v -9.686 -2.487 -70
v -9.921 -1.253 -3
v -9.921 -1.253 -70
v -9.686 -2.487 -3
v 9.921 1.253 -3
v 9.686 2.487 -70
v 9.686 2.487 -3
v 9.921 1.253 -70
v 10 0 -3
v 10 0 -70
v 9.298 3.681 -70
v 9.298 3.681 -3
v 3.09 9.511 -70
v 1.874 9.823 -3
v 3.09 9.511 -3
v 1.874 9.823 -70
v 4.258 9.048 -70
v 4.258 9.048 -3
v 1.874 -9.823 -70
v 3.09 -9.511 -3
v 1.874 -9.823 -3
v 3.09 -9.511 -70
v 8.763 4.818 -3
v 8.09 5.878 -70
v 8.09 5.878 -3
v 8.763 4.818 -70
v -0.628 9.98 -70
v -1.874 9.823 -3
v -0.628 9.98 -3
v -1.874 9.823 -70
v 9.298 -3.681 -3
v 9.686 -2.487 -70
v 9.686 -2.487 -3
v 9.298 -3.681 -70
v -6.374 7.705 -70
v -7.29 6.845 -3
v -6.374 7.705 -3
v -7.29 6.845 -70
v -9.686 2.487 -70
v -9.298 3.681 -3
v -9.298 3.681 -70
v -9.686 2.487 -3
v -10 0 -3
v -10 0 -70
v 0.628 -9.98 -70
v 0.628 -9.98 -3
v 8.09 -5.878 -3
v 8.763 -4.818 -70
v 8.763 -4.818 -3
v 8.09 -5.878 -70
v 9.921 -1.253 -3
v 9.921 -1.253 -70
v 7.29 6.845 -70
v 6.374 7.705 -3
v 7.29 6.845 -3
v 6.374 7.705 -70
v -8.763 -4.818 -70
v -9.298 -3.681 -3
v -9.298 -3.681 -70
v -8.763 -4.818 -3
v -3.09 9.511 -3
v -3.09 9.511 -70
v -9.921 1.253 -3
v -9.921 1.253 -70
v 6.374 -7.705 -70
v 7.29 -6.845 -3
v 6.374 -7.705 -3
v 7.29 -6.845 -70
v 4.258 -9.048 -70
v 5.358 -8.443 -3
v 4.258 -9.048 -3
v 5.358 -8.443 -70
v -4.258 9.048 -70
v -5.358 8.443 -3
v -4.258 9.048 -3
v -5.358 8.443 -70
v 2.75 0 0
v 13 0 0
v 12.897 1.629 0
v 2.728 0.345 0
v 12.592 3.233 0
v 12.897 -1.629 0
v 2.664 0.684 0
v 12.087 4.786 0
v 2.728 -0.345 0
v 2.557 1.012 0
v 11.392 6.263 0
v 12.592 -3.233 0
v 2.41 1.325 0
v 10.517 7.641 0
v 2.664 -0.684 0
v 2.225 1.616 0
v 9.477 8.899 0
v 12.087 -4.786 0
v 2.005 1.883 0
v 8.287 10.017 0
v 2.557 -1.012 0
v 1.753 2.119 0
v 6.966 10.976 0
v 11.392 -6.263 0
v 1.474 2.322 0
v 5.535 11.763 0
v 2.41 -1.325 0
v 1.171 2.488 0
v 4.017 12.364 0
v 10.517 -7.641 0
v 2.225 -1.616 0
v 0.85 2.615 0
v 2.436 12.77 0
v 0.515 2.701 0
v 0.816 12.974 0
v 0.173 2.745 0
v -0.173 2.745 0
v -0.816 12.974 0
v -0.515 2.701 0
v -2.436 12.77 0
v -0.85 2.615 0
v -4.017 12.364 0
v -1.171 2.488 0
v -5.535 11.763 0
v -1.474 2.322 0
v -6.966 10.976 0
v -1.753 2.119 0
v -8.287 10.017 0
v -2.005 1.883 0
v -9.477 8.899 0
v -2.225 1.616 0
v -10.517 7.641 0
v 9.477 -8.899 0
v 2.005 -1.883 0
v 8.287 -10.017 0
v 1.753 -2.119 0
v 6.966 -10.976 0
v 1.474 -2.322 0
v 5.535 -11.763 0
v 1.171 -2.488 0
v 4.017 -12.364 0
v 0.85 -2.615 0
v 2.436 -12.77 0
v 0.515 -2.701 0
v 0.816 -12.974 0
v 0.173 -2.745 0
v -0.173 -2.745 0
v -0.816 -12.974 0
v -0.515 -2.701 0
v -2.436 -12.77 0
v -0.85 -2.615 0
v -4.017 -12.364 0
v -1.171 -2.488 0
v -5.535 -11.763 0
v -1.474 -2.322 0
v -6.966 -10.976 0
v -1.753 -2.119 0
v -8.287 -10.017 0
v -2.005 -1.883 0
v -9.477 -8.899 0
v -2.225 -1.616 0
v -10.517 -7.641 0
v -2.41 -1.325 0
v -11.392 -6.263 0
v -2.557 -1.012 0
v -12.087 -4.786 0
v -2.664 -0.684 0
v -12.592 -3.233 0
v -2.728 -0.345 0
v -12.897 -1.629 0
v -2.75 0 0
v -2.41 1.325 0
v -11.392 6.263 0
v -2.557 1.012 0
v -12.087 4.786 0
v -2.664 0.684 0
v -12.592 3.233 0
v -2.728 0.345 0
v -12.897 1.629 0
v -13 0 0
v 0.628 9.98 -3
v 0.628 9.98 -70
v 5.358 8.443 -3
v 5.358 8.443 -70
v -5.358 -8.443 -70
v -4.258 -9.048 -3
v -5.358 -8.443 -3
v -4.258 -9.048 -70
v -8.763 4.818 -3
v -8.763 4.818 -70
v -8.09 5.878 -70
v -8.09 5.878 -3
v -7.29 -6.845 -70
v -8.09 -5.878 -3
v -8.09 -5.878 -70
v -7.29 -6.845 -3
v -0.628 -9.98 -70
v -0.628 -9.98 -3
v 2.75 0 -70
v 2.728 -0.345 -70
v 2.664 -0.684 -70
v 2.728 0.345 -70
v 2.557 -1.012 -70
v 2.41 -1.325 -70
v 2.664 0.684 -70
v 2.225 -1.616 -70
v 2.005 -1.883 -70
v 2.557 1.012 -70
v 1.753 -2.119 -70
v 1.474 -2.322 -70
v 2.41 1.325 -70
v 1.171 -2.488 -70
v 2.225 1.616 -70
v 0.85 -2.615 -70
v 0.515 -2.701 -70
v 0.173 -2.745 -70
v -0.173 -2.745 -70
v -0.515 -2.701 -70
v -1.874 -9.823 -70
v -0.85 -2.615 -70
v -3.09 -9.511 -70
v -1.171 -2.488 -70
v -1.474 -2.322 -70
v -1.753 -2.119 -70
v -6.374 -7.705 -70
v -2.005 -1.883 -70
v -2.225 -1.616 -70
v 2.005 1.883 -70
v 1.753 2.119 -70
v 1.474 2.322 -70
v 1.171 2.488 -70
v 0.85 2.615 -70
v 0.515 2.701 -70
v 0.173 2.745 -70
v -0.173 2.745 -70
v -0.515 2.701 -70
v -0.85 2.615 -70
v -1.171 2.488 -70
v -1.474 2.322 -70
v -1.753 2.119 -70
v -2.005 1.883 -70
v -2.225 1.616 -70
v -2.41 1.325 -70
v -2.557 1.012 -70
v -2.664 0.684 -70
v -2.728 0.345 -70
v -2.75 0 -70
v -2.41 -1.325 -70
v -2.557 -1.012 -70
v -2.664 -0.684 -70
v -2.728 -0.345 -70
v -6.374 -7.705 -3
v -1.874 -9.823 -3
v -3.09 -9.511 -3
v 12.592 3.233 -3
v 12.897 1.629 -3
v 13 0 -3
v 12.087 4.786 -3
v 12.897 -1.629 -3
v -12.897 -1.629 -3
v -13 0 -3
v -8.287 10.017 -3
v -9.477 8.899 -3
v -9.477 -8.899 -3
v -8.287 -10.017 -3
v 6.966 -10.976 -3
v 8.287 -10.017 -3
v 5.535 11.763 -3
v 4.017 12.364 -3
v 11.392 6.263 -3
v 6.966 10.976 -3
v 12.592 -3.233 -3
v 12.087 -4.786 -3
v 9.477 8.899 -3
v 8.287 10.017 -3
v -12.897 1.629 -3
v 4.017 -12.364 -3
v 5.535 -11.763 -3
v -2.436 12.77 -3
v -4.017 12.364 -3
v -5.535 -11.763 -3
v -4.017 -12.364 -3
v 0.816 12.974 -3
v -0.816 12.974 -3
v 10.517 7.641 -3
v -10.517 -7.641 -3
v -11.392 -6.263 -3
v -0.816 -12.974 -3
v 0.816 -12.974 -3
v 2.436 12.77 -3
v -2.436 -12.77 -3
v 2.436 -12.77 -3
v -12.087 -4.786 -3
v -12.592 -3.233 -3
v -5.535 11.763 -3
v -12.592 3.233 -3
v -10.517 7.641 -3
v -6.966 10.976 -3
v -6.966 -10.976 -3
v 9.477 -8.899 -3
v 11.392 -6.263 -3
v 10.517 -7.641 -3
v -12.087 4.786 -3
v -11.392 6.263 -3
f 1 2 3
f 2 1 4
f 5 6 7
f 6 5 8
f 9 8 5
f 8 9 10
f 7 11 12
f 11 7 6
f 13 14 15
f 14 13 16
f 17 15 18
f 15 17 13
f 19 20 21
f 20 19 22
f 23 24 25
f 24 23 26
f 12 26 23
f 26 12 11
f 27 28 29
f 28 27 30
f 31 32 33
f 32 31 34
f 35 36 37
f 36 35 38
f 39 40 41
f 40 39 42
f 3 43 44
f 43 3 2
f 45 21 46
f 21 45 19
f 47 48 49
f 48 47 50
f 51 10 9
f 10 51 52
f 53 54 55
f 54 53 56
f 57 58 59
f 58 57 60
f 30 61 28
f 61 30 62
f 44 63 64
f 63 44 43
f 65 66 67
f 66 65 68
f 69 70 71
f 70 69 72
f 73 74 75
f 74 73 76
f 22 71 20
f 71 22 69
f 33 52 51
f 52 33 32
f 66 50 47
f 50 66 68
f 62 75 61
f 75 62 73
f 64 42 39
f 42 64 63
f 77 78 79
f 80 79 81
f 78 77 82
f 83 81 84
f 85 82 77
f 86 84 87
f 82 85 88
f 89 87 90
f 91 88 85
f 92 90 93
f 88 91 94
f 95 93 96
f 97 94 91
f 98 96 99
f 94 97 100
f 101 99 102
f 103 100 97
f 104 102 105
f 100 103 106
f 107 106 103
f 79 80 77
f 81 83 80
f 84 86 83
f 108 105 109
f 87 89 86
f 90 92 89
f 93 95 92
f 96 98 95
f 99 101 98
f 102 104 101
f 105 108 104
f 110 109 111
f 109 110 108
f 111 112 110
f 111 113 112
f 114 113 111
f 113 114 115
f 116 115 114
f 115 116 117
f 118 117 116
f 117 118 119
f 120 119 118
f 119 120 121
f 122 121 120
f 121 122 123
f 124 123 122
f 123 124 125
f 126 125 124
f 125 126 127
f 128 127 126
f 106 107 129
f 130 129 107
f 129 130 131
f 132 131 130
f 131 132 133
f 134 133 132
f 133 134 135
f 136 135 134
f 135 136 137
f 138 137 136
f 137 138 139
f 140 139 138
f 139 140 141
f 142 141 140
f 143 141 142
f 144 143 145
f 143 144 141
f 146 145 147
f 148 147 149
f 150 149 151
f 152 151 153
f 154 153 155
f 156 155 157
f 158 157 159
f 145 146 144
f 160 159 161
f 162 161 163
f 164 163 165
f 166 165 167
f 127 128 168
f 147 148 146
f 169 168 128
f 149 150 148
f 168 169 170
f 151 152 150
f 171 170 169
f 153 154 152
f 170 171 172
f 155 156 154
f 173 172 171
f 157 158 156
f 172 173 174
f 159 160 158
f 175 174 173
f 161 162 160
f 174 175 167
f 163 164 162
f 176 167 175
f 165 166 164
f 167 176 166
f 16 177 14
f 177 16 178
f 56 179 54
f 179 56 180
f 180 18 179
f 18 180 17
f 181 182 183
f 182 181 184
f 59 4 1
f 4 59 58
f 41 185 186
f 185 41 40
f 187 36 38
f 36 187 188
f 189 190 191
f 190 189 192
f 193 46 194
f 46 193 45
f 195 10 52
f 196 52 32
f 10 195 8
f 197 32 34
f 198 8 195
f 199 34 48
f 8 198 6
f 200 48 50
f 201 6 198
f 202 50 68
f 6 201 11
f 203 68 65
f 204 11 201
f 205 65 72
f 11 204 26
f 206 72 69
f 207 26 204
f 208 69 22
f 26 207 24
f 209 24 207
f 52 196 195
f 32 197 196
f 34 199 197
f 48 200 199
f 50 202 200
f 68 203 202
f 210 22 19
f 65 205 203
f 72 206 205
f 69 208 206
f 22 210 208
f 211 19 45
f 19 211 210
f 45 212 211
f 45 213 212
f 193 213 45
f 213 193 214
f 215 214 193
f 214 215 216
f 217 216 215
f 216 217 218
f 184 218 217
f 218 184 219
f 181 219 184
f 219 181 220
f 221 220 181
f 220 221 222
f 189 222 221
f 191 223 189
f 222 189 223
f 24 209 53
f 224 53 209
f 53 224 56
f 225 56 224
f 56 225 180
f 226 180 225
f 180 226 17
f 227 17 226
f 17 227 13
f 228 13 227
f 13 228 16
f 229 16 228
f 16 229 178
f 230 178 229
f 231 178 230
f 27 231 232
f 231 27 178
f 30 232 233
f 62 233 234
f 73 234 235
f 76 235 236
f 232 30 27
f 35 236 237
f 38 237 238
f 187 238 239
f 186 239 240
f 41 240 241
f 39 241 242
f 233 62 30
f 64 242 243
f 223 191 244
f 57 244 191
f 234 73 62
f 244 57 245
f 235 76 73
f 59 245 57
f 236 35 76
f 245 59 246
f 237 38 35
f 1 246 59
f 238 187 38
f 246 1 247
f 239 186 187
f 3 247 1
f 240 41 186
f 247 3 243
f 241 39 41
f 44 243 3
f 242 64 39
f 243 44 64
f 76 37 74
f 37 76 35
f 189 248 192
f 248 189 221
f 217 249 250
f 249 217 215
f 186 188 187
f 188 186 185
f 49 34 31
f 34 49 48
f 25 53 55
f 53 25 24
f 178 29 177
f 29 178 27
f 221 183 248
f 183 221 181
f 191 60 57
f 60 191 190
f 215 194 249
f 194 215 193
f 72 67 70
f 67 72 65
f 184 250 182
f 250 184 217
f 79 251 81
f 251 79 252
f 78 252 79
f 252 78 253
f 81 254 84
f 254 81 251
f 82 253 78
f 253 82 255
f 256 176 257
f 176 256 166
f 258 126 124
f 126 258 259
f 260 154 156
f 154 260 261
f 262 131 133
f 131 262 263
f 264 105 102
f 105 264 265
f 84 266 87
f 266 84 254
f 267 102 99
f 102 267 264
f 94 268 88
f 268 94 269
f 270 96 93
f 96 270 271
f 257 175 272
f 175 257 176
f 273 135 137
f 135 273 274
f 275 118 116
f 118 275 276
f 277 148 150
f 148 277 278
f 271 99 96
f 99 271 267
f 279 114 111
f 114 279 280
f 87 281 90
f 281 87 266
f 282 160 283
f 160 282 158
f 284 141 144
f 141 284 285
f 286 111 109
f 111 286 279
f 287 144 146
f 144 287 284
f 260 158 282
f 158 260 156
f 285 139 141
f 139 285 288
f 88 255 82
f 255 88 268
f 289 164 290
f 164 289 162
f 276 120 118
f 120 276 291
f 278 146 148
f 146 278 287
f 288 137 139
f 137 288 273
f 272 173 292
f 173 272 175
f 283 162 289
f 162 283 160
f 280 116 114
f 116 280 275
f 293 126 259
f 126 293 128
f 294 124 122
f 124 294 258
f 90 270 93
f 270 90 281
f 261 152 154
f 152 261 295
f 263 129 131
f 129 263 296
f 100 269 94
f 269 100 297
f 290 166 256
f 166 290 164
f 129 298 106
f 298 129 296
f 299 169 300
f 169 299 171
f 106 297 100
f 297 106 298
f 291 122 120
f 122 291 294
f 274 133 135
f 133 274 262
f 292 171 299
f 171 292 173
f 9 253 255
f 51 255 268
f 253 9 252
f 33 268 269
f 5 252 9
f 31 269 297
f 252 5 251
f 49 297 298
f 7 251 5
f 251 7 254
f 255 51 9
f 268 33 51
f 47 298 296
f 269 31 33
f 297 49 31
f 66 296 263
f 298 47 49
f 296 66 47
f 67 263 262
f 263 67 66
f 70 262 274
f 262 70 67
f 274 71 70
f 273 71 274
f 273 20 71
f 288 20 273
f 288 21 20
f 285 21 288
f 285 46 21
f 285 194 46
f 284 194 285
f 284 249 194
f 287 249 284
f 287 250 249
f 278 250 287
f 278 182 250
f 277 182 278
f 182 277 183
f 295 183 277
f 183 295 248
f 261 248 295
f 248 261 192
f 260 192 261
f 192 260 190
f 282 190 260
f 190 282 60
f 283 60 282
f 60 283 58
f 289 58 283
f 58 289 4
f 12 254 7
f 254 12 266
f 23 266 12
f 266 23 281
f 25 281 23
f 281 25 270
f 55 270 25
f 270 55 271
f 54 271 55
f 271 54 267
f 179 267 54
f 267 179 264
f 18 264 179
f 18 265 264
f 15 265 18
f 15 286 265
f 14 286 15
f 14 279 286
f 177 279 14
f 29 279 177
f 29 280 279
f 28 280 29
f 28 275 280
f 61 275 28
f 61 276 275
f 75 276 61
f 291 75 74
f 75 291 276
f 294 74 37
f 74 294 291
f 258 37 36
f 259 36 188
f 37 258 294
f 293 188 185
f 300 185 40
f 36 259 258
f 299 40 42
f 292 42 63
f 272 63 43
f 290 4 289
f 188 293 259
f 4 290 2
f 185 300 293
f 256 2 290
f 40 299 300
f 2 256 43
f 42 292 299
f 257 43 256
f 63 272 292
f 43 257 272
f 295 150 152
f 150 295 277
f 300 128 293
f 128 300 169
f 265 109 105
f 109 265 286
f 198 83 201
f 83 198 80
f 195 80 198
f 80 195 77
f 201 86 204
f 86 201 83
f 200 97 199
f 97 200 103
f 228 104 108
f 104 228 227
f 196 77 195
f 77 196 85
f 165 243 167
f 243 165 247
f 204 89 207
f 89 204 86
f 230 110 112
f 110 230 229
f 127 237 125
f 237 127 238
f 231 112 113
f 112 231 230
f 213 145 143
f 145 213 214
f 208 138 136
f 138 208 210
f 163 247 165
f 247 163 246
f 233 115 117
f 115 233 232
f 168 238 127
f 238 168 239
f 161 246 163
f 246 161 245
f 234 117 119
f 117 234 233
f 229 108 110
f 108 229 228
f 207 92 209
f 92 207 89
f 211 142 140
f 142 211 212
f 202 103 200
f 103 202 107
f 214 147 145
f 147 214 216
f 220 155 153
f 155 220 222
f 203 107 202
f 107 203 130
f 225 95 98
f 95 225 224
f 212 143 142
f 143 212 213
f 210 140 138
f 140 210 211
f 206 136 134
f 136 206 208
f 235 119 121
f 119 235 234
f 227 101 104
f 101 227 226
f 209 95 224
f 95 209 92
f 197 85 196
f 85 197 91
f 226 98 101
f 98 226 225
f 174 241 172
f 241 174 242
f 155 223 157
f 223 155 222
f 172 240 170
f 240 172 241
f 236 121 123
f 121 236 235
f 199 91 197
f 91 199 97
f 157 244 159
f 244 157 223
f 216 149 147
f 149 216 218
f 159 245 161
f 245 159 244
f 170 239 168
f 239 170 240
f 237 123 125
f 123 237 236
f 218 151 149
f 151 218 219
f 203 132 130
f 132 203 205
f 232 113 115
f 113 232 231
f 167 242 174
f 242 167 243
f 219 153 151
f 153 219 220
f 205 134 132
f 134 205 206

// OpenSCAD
$fn = 50;


difference() {
	union() {
		translate(v = [0, 0, -70.0000000000]) {
			cylinder(h = 70, r = 10.0000000000);
		}
		translate(v = [0, 0, -3.0000000000]) {
			cylinder(h = 3, r = 13.0000000000);
		}
	}
	union() {
		#translate(v = [0, 0, -70]) {
			cylinder(h = 70, r = 2.7500000000);
		}
	}
}
